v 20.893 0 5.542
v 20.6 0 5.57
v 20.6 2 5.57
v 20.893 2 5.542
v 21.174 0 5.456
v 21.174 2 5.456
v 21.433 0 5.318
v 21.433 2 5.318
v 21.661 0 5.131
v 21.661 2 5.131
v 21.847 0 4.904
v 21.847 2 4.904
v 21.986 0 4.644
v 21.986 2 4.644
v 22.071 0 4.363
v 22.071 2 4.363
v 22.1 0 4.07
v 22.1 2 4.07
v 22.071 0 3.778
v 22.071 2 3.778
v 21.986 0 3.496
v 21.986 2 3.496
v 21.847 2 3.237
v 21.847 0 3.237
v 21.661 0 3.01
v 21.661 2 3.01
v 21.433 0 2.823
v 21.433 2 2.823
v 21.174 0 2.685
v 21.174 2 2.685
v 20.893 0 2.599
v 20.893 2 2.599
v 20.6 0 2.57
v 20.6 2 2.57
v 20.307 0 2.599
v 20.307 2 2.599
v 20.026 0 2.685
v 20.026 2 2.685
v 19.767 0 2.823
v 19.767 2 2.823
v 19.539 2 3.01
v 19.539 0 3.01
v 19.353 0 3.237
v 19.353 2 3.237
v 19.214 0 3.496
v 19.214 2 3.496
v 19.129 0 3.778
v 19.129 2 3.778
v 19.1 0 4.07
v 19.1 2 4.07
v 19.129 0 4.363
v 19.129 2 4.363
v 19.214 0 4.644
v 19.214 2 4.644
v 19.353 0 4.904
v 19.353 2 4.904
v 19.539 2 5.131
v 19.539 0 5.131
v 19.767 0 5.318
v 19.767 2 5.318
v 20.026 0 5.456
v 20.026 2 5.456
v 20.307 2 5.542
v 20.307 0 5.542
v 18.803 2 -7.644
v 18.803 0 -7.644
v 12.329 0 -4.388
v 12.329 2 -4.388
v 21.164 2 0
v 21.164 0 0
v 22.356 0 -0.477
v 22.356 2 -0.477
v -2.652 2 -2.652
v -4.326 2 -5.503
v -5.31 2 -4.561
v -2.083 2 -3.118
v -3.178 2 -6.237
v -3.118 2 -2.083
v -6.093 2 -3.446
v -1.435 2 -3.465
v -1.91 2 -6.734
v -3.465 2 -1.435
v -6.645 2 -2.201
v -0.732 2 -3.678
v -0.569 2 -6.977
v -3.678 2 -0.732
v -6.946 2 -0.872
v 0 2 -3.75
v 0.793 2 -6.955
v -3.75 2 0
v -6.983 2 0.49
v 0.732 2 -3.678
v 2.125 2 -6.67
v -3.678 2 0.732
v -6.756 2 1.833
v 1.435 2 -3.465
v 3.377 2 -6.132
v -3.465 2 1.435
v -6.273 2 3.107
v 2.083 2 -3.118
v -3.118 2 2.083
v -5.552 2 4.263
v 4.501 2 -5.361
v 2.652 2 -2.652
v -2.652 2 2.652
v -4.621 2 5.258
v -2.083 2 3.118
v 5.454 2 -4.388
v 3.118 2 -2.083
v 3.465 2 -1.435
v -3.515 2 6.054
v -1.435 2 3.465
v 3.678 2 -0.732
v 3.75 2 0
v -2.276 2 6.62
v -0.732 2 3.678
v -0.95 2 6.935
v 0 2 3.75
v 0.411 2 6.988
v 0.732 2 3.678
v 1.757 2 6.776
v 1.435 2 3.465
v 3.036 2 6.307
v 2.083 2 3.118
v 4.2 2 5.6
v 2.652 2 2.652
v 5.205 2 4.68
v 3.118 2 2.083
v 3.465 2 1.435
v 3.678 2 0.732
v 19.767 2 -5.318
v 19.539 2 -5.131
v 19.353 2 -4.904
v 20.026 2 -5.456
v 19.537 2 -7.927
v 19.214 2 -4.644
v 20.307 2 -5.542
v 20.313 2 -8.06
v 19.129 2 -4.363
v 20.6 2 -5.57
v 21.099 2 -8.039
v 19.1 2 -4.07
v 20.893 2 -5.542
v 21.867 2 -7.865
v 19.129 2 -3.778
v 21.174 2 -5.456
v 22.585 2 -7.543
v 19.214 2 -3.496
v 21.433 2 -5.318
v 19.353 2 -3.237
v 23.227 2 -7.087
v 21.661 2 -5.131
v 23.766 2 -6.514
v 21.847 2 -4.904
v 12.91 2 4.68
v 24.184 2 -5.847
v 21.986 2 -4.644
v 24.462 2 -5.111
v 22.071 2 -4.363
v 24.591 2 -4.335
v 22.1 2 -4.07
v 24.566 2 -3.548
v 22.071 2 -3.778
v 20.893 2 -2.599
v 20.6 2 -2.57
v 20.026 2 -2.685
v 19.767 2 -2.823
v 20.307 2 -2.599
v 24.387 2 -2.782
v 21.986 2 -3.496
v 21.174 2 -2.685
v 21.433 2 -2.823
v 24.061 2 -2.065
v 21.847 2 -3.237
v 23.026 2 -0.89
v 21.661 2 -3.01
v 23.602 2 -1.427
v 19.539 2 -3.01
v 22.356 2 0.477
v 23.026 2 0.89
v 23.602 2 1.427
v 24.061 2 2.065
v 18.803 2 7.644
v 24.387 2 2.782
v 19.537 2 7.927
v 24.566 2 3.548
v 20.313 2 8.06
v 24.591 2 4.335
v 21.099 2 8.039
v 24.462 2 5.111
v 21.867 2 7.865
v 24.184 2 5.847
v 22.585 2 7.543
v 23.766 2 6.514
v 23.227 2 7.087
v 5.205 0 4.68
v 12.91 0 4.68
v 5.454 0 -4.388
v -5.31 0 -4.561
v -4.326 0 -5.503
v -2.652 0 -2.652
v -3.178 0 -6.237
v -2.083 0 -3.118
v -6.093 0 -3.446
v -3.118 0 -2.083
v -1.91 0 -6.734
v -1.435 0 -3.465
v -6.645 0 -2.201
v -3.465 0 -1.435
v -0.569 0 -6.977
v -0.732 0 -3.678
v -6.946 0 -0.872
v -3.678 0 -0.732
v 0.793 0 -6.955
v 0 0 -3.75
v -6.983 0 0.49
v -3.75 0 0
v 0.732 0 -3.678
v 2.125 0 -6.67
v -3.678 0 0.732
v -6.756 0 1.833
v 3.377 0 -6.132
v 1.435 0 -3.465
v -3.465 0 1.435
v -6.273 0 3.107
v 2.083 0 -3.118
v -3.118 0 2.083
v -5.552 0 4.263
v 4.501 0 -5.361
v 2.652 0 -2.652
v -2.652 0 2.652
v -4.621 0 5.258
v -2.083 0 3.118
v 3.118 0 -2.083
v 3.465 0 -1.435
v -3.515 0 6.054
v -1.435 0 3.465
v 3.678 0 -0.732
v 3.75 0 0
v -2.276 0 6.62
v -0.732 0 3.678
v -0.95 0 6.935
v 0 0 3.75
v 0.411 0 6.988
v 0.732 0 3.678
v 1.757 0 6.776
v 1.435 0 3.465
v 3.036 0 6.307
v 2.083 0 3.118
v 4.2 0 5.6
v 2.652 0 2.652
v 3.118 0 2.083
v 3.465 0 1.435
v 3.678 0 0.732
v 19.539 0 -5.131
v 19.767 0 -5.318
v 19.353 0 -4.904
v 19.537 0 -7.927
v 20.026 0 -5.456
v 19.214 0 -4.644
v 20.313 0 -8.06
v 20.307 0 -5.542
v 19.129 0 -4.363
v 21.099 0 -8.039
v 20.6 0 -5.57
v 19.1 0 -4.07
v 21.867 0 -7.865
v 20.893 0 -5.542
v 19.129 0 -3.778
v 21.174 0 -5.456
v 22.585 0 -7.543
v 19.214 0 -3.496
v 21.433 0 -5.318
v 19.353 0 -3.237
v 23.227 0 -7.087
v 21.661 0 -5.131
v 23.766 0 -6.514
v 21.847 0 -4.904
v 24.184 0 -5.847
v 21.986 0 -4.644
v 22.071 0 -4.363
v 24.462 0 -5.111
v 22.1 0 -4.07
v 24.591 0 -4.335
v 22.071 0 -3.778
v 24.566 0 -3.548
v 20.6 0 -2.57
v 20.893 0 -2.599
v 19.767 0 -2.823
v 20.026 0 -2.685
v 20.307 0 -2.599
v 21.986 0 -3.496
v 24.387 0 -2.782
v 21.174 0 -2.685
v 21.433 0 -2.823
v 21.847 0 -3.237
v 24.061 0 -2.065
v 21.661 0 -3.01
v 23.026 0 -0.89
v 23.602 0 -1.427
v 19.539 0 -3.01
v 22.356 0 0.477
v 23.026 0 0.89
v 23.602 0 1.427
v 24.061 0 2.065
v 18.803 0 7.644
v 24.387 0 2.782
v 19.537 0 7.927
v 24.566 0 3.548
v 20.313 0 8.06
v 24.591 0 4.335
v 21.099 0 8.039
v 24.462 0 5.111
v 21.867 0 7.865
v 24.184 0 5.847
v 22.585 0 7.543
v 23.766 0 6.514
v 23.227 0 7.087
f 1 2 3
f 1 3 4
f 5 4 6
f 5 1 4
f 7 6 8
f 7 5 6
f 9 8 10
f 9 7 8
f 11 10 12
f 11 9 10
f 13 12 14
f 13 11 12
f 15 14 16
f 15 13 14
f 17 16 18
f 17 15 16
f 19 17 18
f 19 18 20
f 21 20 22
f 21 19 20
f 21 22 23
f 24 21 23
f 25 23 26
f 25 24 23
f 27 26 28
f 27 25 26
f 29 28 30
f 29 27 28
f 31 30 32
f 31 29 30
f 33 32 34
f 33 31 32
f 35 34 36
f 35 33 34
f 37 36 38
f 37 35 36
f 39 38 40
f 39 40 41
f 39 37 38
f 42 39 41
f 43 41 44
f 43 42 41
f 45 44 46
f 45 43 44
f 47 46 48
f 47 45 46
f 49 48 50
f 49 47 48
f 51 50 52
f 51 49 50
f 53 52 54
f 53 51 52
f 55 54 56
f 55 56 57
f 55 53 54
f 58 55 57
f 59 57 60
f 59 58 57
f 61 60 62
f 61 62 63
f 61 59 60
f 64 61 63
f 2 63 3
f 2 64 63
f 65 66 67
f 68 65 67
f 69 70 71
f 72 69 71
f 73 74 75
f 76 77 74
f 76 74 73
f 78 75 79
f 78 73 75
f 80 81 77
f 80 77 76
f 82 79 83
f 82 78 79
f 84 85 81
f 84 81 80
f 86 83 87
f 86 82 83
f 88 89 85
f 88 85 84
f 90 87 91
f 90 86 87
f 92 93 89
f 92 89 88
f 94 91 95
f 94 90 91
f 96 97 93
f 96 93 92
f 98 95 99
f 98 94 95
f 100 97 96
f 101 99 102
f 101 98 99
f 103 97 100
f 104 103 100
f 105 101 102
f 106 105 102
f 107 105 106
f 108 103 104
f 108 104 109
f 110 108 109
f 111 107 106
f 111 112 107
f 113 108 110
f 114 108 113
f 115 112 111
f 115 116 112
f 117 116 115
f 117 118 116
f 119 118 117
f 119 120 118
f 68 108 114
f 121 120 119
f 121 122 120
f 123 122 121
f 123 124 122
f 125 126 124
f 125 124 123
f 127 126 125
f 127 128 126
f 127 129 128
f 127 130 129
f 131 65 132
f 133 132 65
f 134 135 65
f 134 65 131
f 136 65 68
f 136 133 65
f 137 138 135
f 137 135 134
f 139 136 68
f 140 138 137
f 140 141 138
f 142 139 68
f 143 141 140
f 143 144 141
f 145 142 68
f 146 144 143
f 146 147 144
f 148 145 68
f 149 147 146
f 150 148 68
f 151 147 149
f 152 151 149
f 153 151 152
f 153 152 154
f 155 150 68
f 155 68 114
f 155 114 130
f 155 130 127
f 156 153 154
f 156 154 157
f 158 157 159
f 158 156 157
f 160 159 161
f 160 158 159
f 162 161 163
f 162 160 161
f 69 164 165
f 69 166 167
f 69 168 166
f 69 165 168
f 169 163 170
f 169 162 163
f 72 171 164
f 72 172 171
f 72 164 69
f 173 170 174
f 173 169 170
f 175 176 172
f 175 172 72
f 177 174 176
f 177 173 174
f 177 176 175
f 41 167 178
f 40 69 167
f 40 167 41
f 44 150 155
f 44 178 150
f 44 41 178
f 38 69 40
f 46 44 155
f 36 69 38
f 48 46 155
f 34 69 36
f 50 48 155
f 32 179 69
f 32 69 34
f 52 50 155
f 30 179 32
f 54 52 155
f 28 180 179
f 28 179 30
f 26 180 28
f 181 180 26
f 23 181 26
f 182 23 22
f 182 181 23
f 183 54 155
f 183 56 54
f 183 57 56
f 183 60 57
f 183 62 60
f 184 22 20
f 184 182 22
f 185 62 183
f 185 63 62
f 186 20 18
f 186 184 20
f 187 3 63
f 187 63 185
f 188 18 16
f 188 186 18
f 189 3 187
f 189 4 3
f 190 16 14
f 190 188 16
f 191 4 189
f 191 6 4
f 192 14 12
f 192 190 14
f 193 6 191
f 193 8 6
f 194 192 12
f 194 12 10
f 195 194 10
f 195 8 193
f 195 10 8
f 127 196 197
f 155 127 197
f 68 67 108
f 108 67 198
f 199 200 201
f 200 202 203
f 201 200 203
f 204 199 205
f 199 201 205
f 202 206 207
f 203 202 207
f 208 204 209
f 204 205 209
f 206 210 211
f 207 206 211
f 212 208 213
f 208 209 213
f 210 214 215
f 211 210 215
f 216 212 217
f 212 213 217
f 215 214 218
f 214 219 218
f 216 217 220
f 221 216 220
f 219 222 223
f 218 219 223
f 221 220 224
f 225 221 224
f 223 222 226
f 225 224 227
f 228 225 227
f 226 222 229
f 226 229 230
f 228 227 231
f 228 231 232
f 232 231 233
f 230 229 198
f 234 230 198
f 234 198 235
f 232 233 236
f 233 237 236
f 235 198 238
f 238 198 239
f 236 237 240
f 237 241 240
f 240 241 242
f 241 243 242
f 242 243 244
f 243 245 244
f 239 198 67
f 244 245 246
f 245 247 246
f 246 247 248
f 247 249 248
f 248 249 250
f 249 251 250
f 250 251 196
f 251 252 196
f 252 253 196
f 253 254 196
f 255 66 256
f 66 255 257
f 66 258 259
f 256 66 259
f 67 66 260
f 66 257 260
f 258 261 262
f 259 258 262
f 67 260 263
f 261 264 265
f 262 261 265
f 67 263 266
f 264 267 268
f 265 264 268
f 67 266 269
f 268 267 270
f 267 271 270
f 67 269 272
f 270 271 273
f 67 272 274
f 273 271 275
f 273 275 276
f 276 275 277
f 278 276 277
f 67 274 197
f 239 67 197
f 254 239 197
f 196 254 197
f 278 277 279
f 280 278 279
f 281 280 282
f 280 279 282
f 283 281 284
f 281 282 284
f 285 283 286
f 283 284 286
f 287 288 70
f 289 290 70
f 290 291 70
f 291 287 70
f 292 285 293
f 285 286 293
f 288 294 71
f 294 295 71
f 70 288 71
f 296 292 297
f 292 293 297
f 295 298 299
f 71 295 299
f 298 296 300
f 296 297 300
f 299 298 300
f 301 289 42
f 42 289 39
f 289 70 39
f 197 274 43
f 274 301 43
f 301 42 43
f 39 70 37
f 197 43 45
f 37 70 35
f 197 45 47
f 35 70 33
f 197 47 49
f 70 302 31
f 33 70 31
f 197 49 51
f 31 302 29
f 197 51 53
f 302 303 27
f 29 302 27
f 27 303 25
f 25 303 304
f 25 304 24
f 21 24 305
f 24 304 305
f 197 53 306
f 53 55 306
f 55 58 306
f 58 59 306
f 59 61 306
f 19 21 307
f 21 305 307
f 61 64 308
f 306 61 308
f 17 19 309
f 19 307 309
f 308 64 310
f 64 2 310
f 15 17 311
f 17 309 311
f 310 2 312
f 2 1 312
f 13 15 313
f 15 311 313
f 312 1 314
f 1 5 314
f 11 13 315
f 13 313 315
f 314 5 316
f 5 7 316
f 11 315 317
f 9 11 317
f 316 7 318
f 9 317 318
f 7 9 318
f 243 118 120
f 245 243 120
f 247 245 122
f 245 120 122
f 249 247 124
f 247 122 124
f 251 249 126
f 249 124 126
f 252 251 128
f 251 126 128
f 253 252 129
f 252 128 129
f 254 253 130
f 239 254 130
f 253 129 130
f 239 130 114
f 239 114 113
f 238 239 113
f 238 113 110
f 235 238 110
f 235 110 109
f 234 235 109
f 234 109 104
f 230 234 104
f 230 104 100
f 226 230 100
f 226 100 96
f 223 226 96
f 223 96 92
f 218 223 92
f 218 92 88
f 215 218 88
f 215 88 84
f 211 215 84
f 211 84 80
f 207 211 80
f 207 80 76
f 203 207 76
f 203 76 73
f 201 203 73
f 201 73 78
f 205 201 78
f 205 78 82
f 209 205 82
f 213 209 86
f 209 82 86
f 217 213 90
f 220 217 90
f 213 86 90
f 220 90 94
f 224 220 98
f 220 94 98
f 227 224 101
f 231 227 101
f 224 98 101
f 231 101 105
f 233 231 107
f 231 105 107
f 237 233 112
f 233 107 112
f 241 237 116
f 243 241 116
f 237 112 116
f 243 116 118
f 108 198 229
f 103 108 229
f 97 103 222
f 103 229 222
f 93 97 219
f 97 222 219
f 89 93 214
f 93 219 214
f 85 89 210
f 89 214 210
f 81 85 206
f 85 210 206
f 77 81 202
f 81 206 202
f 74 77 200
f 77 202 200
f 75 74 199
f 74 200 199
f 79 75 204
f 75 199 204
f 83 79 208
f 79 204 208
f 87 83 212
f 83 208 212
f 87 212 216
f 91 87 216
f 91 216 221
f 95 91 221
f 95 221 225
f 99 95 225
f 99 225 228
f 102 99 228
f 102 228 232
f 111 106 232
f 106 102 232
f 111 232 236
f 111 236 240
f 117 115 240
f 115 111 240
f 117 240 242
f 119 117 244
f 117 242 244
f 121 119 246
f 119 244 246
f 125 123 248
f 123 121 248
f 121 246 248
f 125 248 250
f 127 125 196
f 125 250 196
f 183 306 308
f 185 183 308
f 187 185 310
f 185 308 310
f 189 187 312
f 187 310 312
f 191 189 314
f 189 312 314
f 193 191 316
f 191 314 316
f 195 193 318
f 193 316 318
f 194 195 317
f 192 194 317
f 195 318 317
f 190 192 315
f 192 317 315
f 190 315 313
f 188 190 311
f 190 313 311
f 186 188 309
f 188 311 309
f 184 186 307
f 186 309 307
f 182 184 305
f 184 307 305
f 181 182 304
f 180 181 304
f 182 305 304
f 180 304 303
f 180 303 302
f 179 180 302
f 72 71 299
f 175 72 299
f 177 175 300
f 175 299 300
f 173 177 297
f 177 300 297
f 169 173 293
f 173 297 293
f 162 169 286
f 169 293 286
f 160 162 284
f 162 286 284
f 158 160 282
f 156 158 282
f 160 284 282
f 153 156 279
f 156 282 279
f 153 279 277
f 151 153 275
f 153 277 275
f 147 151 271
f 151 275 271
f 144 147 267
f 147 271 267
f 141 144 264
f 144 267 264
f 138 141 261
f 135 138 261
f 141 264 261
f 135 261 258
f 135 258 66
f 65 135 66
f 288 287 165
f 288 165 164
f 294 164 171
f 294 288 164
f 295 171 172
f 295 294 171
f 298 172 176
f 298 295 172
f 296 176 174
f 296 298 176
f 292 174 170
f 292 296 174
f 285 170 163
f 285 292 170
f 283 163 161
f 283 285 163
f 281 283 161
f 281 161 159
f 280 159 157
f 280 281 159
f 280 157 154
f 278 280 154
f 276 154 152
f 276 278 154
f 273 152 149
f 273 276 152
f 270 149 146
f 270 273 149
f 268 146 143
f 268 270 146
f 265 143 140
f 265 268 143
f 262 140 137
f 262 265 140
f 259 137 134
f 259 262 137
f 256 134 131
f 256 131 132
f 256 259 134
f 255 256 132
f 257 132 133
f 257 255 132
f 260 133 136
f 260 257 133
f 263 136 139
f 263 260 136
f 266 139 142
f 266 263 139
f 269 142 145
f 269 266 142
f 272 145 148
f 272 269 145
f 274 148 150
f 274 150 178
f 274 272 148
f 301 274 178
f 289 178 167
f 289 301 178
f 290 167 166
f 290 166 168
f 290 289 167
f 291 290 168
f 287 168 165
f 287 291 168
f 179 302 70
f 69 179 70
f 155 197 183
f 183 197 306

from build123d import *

# Parameters (mm, degrees)
SKETCH1_R           = 7
BOSS_EXTRUDE1_DEPTH = 2
SKETCH2_R           = 3.75
CUT_EXTRUDE1_DEPTH  = 11.099504938
BOSS_EXTRUDE2_START = -2
SKETCH3_R           = 1.5
BOSS_EXTRUDE2_DEPTH = 2


with BuildPart() as part:
    # Sketch1 → Boss-Extrude1 (new body)
    with BuildSketch(Plane(origin=(0, 0, 0), x_dir=(1, 0, 0), z_dir=(0, 1, 0))):
        with Locations(Location((0, 0, 0), (0, 0, 270))):
            Circle(SKETCH1_R)
    extrude(amount=BOSS_EXTRUDE1_DEPTH)

    # Sketch2 → Cut-Extrude1 (cut, through all)
    with BuildSketch(Plane(origin=(0, 2, 0), x_dir=(1, 0, 0), z_dir=(0, 1, 0))):
        with Locations(Location((0, 0, 0), (0, 0, 270))):
            Circle(SKETCH2_R)
    extrude(amount=-CUT_EXTRUDE1_DEPTH, mode=Mode.SUBTRACT)

    # Sketch3 → Boss-Extrude2 (add)
    with BuildSketch(Plane(origin=(0, 2, 0), x_dir=(1, 0, 0), z_dir=(0, 1, 0)).offset(BOSS_EXTRUDE2_START)):
        with BuildLine():
            Line((18.802724006, 7.643943352), (12.328977552, 4.387988089))
            Line((12.328977552, 4.387988089), (5.453949077, 4.387988089))
            ThreePointArc((5.453949077, 4.387988089), (6.602183106, 2.326193937), (7, 0))
            ThreePointArc((7, 0), (6.535978508, -2.506189327), (5.205432874, -4.680114165))
            Line((5.205432874, -4.680114165), (12.909805603, -4.680114165))
            Line((12.909805603, -4.680114165), (18.802724006, -7.643943352))
            ThreePointArc((18.802724006, -7.643943352), (24.183733746, -5.847211141), (22.356172256, -0.476593721))
            Line((22.356172256, -0.476593721), (21.164441, 0))
            Line((21.164441, 0), (22.356172256, 0.476593721))
            ThreePointArc((22.356172256, 0.476593721), (24.183733746, 5.847211141), (18.802724006, 7.643943352))
        make_face()
        with Locations(Location((20.6, -4.070457799, 0), (0, 0, 270))):
            Circle(SKETCH3_R, mode=Mode.SUBTRACT)
        with Locations(Location((20.6, 4.070457799, 0), (0, 0, 270))):
            Circle(SKETCH3_R, mode=Mode.SUBTRACT)
    extrude(amount=BOSS_EXTRUDE2_DEPTH)


solid = part.part
